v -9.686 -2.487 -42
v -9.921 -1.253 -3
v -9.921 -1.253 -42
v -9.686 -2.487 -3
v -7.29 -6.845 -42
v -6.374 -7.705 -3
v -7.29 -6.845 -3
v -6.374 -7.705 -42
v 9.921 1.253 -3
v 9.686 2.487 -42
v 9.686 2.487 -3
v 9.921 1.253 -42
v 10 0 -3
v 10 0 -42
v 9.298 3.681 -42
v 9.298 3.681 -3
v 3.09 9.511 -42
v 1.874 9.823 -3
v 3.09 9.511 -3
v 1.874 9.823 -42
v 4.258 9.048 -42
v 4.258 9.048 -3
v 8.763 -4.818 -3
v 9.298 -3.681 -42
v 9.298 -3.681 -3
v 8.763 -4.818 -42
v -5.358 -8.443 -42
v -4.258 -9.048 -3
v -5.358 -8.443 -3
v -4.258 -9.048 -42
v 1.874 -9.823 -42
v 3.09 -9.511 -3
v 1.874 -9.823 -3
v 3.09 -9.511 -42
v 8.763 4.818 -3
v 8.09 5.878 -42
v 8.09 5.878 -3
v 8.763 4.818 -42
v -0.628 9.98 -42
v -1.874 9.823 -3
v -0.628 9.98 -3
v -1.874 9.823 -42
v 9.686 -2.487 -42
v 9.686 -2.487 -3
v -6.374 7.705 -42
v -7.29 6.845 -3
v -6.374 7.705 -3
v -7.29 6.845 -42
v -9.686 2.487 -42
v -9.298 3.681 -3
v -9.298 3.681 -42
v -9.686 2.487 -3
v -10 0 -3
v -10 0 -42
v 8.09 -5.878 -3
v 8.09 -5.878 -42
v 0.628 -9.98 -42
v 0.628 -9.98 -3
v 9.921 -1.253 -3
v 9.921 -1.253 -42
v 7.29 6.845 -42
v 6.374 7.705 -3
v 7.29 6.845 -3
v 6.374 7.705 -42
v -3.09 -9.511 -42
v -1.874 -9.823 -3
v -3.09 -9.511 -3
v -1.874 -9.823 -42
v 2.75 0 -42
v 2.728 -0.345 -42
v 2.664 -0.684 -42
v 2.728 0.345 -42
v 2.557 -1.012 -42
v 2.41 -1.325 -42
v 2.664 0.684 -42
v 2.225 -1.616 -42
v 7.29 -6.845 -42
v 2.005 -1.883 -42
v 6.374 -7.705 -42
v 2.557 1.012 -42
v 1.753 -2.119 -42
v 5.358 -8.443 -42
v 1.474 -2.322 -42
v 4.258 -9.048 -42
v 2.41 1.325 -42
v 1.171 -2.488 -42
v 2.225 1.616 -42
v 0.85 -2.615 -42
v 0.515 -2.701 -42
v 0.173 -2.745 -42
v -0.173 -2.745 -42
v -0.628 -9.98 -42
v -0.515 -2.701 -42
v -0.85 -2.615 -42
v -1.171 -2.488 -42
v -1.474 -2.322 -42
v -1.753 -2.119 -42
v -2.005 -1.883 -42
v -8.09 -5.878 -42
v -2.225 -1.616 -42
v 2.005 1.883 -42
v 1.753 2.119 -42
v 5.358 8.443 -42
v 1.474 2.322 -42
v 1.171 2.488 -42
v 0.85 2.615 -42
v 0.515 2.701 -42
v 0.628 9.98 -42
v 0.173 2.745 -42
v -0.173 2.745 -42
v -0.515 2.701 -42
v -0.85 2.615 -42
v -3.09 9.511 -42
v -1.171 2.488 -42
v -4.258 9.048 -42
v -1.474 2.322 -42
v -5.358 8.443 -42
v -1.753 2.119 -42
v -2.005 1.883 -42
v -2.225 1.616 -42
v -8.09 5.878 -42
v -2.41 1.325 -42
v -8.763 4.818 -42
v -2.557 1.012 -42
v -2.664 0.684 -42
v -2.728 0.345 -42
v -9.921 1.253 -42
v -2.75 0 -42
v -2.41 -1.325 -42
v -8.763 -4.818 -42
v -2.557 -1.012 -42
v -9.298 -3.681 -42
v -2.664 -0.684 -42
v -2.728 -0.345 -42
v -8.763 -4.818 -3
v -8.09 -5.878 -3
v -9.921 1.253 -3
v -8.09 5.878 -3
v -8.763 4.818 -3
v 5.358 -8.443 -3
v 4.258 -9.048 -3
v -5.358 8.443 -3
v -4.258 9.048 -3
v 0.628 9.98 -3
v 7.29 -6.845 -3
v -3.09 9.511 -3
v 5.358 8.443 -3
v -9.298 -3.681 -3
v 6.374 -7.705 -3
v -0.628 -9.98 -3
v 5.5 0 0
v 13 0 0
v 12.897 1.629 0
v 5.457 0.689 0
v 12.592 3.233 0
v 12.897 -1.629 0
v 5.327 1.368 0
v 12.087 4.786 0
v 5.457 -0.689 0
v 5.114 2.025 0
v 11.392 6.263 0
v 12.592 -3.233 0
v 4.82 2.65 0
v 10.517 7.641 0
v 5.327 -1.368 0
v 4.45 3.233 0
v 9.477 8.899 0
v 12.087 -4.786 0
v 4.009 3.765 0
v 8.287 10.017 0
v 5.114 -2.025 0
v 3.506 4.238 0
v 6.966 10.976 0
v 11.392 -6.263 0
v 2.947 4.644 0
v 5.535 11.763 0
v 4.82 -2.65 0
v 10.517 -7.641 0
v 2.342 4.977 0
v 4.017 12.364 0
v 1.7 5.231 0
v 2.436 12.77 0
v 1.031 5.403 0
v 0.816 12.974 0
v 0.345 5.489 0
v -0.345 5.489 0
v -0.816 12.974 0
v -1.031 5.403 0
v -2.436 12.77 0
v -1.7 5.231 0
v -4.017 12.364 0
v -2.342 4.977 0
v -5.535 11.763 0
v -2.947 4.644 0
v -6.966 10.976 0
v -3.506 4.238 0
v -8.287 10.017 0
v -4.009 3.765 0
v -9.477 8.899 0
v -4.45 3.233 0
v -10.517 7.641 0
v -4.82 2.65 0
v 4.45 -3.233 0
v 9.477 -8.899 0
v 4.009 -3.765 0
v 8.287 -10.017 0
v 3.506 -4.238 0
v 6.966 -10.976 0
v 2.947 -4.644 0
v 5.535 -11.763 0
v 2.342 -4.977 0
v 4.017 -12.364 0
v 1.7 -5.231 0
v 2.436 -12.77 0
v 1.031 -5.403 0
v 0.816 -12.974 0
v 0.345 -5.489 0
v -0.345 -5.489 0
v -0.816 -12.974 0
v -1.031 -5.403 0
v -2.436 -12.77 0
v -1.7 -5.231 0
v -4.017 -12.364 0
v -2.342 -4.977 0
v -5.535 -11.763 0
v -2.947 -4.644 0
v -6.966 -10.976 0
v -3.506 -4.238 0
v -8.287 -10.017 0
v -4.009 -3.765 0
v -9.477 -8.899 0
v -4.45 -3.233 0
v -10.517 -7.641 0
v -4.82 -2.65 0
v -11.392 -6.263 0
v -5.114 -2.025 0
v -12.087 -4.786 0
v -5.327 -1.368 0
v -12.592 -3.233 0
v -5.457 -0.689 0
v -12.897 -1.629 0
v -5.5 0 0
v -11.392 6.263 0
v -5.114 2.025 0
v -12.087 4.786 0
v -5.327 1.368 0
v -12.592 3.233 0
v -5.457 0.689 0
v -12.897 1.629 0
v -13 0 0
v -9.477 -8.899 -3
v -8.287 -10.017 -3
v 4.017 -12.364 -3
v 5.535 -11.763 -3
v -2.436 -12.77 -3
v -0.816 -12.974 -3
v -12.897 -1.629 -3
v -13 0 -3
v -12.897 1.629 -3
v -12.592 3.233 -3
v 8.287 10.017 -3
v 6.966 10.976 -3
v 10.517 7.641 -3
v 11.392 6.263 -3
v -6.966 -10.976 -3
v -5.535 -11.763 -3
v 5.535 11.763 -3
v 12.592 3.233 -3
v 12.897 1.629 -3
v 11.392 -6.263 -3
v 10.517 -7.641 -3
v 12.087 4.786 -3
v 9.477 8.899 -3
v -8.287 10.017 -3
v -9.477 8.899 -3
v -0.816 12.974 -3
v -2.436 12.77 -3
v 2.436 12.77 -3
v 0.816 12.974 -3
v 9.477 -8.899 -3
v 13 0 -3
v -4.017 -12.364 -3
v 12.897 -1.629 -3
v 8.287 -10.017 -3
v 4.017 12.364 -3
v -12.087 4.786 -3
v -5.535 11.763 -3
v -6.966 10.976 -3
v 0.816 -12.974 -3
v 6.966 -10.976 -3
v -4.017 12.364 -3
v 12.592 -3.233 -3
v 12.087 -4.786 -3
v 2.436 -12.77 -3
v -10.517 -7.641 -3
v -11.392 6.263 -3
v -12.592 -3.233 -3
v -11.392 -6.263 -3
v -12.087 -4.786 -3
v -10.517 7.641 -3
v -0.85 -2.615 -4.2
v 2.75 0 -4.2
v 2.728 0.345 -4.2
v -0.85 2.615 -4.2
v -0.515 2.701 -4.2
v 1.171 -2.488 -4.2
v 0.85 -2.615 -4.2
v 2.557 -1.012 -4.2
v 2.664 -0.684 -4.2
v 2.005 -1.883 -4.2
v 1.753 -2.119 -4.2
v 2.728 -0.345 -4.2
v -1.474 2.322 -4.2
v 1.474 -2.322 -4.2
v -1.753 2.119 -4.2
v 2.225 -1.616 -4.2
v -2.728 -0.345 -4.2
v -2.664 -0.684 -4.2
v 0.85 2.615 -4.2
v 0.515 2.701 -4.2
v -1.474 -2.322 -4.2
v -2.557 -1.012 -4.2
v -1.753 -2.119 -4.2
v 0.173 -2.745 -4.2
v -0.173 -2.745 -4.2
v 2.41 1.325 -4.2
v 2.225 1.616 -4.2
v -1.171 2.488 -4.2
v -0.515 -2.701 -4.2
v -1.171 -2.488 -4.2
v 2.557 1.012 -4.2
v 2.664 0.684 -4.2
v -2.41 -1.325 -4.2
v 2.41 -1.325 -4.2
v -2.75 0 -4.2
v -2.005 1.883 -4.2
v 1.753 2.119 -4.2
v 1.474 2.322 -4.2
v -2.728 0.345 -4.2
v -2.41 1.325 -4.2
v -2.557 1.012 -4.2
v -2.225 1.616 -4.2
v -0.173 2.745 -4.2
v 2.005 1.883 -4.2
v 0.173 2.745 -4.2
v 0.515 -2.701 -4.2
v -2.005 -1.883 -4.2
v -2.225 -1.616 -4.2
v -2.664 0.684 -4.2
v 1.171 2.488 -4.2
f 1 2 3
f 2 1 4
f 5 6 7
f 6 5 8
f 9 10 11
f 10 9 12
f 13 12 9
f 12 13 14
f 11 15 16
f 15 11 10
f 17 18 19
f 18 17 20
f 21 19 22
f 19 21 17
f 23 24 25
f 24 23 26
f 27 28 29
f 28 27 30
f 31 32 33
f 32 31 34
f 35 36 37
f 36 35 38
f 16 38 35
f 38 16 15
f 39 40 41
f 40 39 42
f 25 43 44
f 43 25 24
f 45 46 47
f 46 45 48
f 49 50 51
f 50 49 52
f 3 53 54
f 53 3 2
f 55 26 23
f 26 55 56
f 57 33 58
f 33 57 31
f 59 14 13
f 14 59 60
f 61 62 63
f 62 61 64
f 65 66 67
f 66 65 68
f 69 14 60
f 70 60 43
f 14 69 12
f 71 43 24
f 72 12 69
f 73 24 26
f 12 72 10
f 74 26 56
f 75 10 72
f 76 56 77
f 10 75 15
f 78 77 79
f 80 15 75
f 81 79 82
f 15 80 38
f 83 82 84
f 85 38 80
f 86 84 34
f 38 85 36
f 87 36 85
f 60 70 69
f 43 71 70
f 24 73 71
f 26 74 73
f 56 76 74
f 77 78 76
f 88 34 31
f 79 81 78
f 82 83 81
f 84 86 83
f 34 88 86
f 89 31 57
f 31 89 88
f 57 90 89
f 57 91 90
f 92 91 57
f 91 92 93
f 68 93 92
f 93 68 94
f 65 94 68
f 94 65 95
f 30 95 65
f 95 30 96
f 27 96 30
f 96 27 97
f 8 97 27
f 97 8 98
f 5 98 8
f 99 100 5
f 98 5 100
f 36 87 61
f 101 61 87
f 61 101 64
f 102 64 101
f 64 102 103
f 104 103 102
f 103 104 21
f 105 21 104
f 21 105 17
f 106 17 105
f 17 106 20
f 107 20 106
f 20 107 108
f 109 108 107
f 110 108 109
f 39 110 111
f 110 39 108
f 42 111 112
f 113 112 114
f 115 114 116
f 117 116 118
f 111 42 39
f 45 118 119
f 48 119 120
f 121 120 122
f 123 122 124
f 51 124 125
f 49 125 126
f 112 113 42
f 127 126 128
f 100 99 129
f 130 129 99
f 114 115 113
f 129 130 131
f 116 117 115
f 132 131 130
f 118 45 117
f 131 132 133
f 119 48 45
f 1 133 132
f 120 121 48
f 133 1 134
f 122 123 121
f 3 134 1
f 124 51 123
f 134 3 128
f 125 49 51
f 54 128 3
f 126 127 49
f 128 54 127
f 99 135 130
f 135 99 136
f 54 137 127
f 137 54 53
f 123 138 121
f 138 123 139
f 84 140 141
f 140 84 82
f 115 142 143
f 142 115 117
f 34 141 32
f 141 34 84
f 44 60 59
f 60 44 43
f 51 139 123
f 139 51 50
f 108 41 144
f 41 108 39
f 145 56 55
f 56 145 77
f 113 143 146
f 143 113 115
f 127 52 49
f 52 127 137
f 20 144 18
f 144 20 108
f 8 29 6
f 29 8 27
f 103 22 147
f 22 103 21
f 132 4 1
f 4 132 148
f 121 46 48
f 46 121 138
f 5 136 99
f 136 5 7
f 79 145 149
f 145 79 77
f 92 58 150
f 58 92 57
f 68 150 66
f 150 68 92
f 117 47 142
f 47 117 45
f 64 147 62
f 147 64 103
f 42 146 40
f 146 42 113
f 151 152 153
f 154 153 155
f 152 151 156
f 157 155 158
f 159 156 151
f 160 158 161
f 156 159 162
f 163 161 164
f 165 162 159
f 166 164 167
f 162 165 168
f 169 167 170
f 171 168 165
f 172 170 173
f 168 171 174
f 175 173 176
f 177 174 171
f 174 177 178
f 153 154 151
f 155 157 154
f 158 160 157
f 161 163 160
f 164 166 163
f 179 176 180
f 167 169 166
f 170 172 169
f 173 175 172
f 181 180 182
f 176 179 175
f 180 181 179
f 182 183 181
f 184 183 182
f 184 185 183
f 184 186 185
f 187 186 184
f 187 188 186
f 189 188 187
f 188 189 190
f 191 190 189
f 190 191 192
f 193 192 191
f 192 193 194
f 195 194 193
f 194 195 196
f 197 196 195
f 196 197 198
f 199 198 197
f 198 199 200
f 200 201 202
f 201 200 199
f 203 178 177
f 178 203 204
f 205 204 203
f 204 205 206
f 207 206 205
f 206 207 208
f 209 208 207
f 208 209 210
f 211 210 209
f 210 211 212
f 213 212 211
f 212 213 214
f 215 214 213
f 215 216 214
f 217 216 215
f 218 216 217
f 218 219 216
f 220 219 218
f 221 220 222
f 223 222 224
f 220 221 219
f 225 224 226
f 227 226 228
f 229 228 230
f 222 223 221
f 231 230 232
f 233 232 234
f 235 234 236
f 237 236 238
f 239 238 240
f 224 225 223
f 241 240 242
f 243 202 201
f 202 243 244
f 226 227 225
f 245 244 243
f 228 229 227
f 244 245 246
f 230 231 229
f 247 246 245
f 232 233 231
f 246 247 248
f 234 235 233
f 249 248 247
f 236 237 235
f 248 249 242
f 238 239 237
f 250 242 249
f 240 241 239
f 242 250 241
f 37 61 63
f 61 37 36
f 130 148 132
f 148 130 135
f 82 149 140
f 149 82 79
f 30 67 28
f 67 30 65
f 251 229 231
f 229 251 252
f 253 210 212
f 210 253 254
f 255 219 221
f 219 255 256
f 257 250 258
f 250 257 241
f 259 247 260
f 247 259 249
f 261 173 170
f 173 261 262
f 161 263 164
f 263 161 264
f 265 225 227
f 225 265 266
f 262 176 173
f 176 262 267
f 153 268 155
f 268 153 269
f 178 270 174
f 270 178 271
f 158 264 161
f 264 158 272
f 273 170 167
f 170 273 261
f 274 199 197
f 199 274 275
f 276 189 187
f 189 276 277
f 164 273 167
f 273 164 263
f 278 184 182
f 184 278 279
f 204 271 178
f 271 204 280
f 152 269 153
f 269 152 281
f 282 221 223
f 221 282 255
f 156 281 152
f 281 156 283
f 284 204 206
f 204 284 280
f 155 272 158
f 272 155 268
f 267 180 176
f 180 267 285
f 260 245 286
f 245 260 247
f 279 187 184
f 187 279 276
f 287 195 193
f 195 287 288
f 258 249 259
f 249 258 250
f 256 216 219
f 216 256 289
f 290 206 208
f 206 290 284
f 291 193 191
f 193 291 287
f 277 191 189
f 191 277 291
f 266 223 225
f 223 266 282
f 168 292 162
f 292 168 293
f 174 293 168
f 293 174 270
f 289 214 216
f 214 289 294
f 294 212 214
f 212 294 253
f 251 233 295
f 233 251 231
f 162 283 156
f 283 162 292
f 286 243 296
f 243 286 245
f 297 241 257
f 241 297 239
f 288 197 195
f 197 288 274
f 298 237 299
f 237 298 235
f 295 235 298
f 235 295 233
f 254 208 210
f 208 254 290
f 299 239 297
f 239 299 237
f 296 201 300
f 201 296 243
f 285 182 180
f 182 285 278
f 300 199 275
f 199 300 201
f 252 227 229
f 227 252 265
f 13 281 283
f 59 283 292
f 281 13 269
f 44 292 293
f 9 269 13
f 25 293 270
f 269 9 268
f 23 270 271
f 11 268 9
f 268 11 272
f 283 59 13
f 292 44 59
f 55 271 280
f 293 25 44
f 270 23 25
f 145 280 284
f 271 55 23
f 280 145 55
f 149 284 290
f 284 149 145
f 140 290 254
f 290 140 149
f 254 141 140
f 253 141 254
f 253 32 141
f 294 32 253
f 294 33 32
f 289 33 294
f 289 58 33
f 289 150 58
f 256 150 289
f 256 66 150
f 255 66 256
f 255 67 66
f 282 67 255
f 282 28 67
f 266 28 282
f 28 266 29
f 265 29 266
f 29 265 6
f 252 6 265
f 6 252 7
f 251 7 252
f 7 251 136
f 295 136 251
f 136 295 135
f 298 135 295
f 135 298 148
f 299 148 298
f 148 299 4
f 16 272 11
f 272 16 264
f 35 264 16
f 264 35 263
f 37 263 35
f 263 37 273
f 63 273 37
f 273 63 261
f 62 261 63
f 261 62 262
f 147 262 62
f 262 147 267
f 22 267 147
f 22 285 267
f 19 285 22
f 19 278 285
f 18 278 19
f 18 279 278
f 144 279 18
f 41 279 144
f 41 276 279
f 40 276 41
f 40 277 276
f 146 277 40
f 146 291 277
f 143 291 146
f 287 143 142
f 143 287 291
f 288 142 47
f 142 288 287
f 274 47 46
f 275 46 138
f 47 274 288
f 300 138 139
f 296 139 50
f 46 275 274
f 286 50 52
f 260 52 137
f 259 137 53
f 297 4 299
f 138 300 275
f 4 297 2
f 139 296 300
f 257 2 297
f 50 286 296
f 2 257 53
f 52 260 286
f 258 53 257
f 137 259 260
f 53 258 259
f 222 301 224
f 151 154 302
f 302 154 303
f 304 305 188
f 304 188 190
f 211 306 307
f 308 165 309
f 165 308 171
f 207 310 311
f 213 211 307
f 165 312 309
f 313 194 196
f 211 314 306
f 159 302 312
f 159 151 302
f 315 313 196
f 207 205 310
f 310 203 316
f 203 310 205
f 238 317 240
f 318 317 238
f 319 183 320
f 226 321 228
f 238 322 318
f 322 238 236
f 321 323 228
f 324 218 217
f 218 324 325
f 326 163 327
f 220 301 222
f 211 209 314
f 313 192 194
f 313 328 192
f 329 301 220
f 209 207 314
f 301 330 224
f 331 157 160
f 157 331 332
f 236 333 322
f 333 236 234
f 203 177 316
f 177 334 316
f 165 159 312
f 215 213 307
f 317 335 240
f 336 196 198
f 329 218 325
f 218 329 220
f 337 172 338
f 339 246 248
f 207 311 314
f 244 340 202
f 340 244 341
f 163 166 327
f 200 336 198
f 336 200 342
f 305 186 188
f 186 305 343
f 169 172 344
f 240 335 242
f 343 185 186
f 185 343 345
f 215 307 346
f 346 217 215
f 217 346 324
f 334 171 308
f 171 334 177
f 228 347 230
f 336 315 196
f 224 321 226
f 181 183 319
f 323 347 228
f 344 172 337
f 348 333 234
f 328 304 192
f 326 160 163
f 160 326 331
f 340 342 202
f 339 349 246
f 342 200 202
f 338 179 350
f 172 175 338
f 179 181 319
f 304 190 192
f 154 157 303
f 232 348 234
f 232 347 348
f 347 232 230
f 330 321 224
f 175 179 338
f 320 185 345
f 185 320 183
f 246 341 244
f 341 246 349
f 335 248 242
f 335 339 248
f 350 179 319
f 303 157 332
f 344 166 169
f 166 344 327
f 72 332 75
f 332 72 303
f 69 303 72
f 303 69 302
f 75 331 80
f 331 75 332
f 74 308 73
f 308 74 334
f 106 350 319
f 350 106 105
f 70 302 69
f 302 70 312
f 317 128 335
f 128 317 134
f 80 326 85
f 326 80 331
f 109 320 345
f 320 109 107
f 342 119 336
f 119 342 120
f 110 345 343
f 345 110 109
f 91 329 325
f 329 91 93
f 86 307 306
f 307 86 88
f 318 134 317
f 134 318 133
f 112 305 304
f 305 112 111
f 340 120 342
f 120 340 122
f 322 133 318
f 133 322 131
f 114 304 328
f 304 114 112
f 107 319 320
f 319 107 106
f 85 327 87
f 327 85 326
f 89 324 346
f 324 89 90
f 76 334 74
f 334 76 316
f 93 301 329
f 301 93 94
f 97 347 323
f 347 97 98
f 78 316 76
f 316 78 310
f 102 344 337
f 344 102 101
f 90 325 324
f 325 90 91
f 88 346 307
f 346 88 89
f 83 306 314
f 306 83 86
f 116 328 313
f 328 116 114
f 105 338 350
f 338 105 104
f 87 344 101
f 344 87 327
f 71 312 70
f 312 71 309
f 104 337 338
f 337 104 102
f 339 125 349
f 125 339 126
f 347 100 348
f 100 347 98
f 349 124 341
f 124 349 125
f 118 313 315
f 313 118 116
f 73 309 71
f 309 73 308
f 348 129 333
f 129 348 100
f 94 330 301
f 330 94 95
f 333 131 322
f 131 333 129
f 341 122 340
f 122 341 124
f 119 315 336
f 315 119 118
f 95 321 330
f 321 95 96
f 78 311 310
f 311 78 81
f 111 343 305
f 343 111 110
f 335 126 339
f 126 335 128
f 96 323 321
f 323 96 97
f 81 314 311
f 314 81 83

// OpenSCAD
$fn = 50;


difference() {
	union() {
		translate(v = [0, 0, -42.0000000000]) {
			cylinder(h = 42, r = 10.0000000000);
		}
		translate(v = [0, 0, -3.0000000000]) {
			cylinder(h = 3, r = 13.0000000000);
		}
	}
	union() {
		translate(v = [0, 0, 0]) {
			rotate(a = [0, 0, 0]) {
				difference() {
					union() {
						#translate(v = [0, 0, -42.0000000000]) {
							cylinder(h = 42, r = 2.2500000000);
						}
						#translate(v = [0, 0, -4.2000000000]) {
							cylinder(h = 4.2000000000, r1 = 2.7500000000, r2 = 5.5000000000);
						}
						#translate(v = [0, 0, -42.0000000000]) {
							cylinder(h = 42, r = 2.7500000000);
						}
						#translate(v = [0, 0, -42.0000000000]) {
							cylinder(h = 42, r = 2.2500000000);
						}
					}
					union();
				}
			}
		}
	}
}
